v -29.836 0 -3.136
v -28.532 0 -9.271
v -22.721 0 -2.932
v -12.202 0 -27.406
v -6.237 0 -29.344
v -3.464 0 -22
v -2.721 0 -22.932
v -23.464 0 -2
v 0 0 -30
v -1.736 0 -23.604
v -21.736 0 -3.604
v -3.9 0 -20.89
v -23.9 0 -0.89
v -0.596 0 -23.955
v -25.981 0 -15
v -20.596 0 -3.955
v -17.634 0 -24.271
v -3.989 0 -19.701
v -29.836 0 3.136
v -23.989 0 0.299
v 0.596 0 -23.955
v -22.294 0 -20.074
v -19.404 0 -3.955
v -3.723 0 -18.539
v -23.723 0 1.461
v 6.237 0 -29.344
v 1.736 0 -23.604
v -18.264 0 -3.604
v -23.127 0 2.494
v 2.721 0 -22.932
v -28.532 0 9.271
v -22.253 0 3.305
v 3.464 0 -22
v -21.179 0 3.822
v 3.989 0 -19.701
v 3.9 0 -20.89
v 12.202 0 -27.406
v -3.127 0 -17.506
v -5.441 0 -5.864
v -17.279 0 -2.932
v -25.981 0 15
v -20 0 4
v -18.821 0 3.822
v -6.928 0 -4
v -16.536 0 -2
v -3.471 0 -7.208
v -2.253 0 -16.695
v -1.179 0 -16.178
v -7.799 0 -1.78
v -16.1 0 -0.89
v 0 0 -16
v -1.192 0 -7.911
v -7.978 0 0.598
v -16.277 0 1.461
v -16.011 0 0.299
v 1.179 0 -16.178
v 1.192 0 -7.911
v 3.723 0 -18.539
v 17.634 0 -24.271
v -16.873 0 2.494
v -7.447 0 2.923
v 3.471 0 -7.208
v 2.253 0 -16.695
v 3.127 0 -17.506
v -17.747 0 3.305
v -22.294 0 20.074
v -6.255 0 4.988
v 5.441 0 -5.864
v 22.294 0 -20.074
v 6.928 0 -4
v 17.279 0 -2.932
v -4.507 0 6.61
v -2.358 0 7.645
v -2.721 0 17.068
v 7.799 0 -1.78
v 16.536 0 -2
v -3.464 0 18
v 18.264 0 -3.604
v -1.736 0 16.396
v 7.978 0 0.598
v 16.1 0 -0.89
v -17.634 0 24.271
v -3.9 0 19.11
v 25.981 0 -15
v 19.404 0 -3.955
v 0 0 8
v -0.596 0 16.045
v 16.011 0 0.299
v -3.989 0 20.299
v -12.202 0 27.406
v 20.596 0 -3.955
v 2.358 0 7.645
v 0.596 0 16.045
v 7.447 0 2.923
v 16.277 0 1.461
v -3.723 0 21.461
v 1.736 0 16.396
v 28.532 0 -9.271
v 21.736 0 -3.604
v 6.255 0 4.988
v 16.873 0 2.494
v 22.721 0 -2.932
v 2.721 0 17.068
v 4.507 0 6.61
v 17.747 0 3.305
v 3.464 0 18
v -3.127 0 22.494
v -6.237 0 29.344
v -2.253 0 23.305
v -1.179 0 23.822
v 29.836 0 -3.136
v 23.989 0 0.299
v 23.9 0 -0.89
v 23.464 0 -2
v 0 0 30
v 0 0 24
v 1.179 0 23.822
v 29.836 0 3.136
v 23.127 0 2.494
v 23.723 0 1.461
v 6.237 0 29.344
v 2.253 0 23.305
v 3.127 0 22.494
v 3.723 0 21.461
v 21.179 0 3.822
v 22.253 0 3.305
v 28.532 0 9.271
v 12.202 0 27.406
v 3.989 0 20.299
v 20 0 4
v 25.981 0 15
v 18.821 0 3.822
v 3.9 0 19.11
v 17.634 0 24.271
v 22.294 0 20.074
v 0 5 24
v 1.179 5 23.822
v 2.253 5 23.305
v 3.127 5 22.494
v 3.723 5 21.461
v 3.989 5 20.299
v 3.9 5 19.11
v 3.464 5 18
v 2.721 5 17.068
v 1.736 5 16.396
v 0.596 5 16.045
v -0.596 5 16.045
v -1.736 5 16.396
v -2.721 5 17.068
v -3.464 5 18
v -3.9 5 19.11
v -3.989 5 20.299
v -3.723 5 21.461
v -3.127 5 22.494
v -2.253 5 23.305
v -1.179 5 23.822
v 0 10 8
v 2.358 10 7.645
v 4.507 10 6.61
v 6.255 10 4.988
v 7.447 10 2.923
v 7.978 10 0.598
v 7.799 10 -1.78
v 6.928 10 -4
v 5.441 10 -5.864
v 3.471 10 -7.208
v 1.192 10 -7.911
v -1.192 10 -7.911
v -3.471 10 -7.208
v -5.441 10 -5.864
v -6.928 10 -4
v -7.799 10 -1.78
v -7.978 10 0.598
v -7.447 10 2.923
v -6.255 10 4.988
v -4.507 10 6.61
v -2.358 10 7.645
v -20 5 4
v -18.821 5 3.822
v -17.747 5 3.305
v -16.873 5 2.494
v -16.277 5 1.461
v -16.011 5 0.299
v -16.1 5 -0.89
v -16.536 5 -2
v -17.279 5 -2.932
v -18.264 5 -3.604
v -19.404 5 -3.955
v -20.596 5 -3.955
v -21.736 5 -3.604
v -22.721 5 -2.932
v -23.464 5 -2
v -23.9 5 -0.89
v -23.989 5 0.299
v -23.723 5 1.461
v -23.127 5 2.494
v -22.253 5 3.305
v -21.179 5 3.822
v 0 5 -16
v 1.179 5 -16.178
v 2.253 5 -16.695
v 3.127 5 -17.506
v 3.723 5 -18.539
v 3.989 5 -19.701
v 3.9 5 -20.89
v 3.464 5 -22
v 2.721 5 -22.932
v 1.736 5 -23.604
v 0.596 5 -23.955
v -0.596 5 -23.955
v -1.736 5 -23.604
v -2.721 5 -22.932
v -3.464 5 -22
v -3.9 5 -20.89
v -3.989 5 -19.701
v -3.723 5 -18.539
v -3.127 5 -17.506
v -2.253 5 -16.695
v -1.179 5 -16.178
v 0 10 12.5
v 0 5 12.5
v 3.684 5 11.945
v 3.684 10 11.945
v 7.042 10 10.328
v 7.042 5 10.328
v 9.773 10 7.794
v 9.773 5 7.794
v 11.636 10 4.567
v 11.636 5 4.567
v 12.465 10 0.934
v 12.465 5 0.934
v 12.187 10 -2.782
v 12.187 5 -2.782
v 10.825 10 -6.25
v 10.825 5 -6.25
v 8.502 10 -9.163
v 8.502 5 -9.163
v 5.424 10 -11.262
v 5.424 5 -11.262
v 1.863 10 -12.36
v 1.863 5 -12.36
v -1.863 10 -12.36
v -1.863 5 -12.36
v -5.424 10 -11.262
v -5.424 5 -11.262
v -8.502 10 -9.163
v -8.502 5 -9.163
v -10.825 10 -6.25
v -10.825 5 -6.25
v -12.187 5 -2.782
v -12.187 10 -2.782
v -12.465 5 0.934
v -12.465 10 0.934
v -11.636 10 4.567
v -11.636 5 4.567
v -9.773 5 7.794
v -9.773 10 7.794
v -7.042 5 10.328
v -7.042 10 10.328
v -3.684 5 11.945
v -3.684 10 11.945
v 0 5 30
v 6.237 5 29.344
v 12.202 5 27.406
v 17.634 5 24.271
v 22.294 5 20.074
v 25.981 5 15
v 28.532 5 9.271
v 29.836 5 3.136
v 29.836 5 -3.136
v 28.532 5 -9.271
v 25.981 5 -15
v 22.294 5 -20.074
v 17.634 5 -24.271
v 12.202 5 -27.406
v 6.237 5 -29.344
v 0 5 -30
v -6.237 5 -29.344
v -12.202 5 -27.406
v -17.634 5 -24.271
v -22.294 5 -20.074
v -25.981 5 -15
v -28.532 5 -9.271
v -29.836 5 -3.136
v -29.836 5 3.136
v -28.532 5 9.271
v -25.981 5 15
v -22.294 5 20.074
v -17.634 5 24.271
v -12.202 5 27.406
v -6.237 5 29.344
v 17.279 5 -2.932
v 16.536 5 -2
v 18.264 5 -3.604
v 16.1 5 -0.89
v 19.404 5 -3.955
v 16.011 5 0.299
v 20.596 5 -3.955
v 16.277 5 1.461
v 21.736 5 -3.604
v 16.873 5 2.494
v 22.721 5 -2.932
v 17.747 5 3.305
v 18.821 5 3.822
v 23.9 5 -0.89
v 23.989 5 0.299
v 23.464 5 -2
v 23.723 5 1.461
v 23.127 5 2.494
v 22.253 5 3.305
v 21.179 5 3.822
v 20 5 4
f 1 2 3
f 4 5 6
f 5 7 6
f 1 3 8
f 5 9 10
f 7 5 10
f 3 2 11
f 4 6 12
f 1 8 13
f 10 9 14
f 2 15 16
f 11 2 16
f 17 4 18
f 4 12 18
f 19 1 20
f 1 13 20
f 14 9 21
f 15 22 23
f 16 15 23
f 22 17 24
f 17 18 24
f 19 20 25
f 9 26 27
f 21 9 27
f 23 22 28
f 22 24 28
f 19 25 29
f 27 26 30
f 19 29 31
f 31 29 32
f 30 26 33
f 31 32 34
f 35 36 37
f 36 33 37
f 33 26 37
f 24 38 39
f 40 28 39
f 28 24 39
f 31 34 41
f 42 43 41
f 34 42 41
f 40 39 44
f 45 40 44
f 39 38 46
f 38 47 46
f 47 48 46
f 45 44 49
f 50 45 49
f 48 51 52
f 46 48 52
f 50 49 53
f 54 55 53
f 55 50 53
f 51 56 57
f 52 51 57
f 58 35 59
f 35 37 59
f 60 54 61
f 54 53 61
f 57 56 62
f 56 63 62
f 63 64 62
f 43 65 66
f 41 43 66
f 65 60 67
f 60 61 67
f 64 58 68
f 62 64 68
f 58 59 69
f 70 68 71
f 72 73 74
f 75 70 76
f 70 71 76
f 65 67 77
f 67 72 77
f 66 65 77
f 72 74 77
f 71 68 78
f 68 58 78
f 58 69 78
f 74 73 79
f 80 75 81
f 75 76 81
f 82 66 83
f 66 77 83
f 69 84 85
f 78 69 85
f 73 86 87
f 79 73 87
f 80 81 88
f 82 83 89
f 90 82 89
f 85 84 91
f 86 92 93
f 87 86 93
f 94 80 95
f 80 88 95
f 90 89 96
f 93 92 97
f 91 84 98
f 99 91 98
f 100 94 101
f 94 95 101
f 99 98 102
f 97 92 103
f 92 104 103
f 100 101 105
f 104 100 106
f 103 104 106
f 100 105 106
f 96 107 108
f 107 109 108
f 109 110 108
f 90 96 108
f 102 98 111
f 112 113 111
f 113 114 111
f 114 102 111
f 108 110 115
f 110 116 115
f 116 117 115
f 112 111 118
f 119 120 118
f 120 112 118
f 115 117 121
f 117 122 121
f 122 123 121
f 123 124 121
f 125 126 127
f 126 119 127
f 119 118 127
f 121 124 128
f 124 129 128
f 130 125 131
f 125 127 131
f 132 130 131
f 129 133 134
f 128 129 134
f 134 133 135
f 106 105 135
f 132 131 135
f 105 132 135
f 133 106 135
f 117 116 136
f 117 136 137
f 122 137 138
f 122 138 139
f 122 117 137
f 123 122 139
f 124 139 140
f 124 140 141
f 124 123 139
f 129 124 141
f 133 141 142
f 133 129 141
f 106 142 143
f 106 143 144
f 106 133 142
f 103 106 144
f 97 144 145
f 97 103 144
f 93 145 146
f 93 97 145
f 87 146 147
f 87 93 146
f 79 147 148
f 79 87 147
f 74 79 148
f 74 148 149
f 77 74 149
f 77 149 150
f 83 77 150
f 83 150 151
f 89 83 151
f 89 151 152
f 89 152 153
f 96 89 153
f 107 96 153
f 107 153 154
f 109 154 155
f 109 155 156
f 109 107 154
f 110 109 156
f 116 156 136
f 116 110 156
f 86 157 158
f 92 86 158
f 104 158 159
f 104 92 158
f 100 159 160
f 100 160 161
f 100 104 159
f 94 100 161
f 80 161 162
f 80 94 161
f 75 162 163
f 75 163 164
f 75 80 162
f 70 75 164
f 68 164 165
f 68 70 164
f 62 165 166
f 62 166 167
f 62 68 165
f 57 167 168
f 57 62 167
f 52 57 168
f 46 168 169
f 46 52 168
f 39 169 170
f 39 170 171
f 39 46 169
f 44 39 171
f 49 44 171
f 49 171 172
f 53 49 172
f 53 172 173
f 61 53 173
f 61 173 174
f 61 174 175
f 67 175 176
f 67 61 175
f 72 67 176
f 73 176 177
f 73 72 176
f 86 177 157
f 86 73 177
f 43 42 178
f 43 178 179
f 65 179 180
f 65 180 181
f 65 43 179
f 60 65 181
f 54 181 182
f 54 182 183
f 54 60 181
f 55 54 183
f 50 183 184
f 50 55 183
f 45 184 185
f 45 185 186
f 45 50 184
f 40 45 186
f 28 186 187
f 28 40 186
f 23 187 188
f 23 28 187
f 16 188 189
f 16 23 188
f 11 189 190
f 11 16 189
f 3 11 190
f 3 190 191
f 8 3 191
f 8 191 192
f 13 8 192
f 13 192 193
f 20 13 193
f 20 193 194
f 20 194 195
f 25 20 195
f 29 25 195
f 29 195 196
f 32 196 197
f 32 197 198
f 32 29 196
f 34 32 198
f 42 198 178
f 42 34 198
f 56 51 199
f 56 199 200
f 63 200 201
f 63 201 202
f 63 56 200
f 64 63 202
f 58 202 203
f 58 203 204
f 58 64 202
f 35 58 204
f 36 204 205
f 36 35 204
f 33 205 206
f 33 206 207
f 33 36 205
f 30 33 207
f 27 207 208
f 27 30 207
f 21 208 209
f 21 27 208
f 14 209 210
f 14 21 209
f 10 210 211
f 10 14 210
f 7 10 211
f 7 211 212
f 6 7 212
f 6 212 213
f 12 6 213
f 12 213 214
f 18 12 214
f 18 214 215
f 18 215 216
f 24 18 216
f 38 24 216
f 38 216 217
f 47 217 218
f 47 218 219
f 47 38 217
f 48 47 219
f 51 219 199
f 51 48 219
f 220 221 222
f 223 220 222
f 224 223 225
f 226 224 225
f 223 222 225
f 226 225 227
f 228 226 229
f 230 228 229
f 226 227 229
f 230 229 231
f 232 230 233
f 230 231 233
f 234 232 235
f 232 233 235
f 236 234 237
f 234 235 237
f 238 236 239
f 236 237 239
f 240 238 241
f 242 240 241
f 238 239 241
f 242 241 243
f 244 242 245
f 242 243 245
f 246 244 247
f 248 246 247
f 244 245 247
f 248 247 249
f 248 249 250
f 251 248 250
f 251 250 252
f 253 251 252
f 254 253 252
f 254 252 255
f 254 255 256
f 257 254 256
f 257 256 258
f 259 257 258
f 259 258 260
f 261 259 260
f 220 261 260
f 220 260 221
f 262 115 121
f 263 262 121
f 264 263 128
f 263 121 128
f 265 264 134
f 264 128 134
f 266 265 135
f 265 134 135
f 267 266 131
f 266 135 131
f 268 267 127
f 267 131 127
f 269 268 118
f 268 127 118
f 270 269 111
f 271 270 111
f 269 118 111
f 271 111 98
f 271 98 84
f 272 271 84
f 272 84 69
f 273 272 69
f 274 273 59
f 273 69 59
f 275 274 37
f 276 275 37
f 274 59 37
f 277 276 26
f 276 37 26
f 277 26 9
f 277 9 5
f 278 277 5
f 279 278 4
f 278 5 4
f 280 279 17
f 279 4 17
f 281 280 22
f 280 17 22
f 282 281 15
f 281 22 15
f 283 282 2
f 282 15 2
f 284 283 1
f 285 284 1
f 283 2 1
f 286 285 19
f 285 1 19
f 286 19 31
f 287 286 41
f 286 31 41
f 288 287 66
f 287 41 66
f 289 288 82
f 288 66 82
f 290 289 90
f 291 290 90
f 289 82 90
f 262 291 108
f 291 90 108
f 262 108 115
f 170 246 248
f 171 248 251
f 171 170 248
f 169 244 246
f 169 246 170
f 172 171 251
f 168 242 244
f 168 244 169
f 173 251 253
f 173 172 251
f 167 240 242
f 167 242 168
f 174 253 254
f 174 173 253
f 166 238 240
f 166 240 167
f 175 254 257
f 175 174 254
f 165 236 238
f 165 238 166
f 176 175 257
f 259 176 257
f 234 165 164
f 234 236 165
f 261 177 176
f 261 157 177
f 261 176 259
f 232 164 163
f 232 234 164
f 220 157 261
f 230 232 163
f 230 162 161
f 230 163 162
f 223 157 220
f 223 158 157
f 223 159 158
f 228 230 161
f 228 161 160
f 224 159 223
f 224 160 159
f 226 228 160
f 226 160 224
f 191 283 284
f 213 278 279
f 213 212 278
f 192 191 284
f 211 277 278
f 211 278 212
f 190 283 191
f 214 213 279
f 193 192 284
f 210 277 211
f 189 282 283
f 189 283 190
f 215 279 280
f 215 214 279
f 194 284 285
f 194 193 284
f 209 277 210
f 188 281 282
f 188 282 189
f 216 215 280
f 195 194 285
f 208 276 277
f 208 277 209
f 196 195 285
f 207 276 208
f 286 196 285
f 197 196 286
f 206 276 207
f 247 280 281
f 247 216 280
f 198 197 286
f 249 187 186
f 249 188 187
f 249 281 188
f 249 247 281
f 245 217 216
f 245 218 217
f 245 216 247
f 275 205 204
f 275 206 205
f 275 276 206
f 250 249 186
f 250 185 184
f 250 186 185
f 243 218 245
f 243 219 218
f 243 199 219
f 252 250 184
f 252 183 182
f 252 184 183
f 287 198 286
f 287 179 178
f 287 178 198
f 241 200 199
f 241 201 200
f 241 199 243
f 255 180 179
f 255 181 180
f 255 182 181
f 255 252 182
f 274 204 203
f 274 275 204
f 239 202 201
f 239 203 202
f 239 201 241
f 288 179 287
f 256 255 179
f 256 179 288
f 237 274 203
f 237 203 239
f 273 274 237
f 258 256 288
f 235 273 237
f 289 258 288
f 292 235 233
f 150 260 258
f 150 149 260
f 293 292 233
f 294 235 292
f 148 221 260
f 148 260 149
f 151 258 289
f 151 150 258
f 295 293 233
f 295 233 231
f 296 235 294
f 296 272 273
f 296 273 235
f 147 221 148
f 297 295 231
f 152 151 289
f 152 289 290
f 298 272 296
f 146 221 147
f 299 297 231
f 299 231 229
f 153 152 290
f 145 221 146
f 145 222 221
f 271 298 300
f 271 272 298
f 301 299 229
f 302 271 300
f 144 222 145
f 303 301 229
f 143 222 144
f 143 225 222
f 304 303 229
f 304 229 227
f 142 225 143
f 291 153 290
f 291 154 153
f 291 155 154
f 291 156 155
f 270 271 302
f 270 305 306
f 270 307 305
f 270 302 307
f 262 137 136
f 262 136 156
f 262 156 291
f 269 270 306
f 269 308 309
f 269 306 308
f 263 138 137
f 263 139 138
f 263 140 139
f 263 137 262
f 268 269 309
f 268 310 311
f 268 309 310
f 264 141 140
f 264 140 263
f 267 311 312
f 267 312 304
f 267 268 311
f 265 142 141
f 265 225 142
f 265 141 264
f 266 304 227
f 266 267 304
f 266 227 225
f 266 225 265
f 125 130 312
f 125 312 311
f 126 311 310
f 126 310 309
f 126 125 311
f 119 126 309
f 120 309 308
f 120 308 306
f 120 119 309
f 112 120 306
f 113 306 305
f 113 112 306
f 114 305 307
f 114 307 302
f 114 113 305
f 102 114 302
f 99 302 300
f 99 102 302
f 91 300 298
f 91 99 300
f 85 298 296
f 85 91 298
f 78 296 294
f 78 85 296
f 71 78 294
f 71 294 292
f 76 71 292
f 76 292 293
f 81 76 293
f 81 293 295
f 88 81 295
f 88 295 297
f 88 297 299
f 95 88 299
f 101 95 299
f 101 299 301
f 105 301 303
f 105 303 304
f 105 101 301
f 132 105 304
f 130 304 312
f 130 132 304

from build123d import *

# Parameters (mm, degrees)
SKETCH1_R           = 30
SKETCH1_R_2         = 4
SKETCH1_R_3         = 12.5
BOSS_EXTRUDE1_DEPTH = 5
SKETCH1_6_R         = 12.5
SKETCH1_6_R_2       = 8
BOSS_EXTRUDE2_DEPTH = 10


with BuildPart() as part:
    # Sketch1 → Boss-Extrude1 (new body)
    with BuildSketch(Plane(origin=(0, 0, 0), x_dir=(1, 0, 0), z_dir=(0, 1, 0))):
        Circle(SKETCH1_R)
        with Locations((0, 20)):
            Circle(SKETCH1_R_2, mode=Mode.SUBTRACT)
        with Locations((20, 0)):
            Circle(SKETCH1_R_2, mode=Mode.SUBTRACT)
        with Locations((0, -20)):
            Circle(SKETCH1_R_2, mode=Mode.SUBTRACT)
        with Locations((-20, 0)):
            Circle(SKETCH1_R_2, mode=Mode.SUBTRACT)
        Circle(SKETCH1_R_3, mode=Mode.SUBTRACT)
    extrude(amount=BOSS_EXTRUDE1_DEPTH)

    # Sketch1<6> → Boss-Extrude2 (add)
    with BuildSketch(Plane(origin=(0, 0, 0), x_dir=(1, 0, 0), z_dir=(0, 1, 0))):
        Circle(SKETCH1_6_R)
        Circle(SKETCH1_6_R_2, mode=Mode.SUBTRACT)
    extrude(amount=BOSS_EXTRUDE2_DEPTH)


solid = part.part
